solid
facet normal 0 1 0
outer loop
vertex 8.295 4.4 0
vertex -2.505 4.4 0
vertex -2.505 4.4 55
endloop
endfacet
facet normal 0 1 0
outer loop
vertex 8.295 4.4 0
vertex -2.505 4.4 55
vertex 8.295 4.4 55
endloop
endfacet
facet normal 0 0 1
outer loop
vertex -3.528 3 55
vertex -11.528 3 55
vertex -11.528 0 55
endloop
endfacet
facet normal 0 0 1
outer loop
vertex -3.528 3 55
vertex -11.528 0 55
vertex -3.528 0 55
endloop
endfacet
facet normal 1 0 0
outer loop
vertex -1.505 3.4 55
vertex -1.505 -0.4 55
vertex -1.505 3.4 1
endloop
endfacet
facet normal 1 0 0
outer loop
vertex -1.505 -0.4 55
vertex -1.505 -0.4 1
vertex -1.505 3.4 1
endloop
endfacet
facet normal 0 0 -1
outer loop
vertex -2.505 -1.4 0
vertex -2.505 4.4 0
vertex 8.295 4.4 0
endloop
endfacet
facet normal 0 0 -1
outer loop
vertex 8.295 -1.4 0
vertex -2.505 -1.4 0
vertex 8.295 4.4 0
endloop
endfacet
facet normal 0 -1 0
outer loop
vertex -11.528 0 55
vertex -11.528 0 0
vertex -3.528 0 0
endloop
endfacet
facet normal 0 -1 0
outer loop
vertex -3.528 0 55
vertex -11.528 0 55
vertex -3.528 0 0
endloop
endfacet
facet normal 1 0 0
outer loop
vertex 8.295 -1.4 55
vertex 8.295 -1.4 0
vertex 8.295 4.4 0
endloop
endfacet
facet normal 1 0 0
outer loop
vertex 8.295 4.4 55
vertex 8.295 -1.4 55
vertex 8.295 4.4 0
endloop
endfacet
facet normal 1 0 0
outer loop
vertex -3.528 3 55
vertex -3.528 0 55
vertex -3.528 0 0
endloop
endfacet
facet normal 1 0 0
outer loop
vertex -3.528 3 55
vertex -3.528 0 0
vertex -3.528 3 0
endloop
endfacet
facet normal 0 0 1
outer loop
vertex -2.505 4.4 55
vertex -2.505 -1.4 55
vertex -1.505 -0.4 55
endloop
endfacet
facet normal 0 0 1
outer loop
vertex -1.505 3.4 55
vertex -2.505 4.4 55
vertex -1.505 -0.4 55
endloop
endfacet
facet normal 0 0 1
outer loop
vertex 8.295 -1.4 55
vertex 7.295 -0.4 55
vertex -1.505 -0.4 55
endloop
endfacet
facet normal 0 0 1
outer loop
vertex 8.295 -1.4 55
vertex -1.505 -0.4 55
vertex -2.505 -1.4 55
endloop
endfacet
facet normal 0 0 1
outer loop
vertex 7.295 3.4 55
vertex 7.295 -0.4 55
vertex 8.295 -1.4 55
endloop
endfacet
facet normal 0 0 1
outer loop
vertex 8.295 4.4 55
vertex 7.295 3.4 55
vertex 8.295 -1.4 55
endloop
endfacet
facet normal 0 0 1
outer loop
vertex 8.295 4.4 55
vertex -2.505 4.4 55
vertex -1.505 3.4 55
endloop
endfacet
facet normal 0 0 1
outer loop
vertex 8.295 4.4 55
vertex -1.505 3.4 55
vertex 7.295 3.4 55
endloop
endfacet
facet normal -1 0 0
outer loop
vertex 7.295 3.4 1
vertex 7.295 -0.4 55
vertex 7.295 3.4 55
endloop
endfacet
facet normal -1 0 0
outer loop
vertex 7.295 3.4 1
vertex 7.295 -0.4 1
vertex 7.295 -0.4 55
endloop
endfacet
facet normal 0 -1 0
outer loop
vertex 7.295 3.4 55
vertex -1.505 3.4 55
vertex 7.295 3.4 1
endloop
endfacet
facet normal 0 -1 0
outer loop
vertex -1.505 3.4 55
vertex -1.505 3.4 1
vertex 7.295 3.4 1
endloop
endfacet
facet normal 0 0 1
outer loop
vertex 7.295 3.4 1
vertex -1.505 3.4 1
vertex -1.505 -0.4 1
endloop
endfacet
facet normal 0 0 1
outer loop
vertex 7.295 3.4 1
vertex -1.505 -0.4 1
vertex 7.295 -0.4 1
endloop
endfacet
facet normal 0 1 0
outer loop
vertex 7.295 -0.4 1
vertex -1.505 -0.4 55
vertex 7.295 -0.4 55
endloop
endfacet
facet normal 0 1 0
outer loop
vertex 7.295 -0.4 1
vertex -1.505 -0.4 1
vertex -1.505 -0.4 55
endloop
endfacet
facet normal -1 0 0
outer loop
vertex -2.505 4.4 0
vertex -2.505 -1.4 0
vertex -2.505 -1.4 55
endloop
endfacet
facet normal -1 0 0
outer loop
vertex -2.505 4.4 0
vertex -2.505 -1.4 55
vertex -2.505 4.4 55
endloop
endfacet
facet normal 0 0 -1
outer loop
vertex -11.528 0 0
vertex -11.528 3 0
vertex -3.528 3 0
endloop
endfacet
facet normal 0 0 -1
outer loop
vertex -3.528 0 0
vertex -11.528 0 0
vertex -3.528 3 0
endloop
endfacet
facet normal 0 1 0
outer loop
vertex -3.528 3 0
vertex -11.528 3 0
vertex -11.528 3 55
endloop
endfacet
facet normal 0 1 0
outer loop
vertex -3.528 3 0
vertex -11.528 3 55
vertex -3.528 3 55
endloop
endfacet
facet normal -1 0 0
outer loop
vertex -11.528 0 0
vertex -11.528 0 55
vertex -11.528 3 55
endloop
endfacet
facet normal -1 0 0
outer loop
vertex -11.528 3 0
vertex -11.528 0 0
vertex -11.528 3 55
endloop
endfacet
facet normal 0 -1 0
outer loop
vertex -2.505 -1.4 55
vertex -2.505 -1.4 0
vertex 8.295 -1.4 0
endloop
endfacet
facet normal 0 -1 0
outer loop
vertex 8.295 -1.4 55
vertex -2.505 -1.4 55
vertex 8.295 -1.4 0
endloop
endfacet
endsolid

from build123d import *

# Parameters (mm, degrees)
F0_W     = 8
F0_H     = 3
F1_DEPTH = 55
F0_W_2   = 10.8
F0_H_2   = 5.8
F2_T     = -1


with BuildPart() as f1:
    # F0 (on Top) → F1 (new body)
    with BuildSketch(Plane.XY):
        with Locations((-7.5276658908, 1.5)):
            Rectangle(F0_W, F0_H)
    extrude(amount=F1_DEPTH)


with BuildPart() as f1b:
    # F0 (on Top) → F1, piece 2 (new body)
    with BuildSketch(Plane.XY):
        with Locations((2.8954485707, 1.5)):
            Rectangle(F0_W_2, F0_H_2)
    extrude(amount=F1_DEPTH)

    # F2
    f2_openings = [f1b.faces().sort_by_distance(p)[0] for p in [
        (2.895449, 1.5, 55),
    ]]
    offset(amount=F2_T, openings=f2_openings)


solid = Compound([f1.part, f1b.part])
